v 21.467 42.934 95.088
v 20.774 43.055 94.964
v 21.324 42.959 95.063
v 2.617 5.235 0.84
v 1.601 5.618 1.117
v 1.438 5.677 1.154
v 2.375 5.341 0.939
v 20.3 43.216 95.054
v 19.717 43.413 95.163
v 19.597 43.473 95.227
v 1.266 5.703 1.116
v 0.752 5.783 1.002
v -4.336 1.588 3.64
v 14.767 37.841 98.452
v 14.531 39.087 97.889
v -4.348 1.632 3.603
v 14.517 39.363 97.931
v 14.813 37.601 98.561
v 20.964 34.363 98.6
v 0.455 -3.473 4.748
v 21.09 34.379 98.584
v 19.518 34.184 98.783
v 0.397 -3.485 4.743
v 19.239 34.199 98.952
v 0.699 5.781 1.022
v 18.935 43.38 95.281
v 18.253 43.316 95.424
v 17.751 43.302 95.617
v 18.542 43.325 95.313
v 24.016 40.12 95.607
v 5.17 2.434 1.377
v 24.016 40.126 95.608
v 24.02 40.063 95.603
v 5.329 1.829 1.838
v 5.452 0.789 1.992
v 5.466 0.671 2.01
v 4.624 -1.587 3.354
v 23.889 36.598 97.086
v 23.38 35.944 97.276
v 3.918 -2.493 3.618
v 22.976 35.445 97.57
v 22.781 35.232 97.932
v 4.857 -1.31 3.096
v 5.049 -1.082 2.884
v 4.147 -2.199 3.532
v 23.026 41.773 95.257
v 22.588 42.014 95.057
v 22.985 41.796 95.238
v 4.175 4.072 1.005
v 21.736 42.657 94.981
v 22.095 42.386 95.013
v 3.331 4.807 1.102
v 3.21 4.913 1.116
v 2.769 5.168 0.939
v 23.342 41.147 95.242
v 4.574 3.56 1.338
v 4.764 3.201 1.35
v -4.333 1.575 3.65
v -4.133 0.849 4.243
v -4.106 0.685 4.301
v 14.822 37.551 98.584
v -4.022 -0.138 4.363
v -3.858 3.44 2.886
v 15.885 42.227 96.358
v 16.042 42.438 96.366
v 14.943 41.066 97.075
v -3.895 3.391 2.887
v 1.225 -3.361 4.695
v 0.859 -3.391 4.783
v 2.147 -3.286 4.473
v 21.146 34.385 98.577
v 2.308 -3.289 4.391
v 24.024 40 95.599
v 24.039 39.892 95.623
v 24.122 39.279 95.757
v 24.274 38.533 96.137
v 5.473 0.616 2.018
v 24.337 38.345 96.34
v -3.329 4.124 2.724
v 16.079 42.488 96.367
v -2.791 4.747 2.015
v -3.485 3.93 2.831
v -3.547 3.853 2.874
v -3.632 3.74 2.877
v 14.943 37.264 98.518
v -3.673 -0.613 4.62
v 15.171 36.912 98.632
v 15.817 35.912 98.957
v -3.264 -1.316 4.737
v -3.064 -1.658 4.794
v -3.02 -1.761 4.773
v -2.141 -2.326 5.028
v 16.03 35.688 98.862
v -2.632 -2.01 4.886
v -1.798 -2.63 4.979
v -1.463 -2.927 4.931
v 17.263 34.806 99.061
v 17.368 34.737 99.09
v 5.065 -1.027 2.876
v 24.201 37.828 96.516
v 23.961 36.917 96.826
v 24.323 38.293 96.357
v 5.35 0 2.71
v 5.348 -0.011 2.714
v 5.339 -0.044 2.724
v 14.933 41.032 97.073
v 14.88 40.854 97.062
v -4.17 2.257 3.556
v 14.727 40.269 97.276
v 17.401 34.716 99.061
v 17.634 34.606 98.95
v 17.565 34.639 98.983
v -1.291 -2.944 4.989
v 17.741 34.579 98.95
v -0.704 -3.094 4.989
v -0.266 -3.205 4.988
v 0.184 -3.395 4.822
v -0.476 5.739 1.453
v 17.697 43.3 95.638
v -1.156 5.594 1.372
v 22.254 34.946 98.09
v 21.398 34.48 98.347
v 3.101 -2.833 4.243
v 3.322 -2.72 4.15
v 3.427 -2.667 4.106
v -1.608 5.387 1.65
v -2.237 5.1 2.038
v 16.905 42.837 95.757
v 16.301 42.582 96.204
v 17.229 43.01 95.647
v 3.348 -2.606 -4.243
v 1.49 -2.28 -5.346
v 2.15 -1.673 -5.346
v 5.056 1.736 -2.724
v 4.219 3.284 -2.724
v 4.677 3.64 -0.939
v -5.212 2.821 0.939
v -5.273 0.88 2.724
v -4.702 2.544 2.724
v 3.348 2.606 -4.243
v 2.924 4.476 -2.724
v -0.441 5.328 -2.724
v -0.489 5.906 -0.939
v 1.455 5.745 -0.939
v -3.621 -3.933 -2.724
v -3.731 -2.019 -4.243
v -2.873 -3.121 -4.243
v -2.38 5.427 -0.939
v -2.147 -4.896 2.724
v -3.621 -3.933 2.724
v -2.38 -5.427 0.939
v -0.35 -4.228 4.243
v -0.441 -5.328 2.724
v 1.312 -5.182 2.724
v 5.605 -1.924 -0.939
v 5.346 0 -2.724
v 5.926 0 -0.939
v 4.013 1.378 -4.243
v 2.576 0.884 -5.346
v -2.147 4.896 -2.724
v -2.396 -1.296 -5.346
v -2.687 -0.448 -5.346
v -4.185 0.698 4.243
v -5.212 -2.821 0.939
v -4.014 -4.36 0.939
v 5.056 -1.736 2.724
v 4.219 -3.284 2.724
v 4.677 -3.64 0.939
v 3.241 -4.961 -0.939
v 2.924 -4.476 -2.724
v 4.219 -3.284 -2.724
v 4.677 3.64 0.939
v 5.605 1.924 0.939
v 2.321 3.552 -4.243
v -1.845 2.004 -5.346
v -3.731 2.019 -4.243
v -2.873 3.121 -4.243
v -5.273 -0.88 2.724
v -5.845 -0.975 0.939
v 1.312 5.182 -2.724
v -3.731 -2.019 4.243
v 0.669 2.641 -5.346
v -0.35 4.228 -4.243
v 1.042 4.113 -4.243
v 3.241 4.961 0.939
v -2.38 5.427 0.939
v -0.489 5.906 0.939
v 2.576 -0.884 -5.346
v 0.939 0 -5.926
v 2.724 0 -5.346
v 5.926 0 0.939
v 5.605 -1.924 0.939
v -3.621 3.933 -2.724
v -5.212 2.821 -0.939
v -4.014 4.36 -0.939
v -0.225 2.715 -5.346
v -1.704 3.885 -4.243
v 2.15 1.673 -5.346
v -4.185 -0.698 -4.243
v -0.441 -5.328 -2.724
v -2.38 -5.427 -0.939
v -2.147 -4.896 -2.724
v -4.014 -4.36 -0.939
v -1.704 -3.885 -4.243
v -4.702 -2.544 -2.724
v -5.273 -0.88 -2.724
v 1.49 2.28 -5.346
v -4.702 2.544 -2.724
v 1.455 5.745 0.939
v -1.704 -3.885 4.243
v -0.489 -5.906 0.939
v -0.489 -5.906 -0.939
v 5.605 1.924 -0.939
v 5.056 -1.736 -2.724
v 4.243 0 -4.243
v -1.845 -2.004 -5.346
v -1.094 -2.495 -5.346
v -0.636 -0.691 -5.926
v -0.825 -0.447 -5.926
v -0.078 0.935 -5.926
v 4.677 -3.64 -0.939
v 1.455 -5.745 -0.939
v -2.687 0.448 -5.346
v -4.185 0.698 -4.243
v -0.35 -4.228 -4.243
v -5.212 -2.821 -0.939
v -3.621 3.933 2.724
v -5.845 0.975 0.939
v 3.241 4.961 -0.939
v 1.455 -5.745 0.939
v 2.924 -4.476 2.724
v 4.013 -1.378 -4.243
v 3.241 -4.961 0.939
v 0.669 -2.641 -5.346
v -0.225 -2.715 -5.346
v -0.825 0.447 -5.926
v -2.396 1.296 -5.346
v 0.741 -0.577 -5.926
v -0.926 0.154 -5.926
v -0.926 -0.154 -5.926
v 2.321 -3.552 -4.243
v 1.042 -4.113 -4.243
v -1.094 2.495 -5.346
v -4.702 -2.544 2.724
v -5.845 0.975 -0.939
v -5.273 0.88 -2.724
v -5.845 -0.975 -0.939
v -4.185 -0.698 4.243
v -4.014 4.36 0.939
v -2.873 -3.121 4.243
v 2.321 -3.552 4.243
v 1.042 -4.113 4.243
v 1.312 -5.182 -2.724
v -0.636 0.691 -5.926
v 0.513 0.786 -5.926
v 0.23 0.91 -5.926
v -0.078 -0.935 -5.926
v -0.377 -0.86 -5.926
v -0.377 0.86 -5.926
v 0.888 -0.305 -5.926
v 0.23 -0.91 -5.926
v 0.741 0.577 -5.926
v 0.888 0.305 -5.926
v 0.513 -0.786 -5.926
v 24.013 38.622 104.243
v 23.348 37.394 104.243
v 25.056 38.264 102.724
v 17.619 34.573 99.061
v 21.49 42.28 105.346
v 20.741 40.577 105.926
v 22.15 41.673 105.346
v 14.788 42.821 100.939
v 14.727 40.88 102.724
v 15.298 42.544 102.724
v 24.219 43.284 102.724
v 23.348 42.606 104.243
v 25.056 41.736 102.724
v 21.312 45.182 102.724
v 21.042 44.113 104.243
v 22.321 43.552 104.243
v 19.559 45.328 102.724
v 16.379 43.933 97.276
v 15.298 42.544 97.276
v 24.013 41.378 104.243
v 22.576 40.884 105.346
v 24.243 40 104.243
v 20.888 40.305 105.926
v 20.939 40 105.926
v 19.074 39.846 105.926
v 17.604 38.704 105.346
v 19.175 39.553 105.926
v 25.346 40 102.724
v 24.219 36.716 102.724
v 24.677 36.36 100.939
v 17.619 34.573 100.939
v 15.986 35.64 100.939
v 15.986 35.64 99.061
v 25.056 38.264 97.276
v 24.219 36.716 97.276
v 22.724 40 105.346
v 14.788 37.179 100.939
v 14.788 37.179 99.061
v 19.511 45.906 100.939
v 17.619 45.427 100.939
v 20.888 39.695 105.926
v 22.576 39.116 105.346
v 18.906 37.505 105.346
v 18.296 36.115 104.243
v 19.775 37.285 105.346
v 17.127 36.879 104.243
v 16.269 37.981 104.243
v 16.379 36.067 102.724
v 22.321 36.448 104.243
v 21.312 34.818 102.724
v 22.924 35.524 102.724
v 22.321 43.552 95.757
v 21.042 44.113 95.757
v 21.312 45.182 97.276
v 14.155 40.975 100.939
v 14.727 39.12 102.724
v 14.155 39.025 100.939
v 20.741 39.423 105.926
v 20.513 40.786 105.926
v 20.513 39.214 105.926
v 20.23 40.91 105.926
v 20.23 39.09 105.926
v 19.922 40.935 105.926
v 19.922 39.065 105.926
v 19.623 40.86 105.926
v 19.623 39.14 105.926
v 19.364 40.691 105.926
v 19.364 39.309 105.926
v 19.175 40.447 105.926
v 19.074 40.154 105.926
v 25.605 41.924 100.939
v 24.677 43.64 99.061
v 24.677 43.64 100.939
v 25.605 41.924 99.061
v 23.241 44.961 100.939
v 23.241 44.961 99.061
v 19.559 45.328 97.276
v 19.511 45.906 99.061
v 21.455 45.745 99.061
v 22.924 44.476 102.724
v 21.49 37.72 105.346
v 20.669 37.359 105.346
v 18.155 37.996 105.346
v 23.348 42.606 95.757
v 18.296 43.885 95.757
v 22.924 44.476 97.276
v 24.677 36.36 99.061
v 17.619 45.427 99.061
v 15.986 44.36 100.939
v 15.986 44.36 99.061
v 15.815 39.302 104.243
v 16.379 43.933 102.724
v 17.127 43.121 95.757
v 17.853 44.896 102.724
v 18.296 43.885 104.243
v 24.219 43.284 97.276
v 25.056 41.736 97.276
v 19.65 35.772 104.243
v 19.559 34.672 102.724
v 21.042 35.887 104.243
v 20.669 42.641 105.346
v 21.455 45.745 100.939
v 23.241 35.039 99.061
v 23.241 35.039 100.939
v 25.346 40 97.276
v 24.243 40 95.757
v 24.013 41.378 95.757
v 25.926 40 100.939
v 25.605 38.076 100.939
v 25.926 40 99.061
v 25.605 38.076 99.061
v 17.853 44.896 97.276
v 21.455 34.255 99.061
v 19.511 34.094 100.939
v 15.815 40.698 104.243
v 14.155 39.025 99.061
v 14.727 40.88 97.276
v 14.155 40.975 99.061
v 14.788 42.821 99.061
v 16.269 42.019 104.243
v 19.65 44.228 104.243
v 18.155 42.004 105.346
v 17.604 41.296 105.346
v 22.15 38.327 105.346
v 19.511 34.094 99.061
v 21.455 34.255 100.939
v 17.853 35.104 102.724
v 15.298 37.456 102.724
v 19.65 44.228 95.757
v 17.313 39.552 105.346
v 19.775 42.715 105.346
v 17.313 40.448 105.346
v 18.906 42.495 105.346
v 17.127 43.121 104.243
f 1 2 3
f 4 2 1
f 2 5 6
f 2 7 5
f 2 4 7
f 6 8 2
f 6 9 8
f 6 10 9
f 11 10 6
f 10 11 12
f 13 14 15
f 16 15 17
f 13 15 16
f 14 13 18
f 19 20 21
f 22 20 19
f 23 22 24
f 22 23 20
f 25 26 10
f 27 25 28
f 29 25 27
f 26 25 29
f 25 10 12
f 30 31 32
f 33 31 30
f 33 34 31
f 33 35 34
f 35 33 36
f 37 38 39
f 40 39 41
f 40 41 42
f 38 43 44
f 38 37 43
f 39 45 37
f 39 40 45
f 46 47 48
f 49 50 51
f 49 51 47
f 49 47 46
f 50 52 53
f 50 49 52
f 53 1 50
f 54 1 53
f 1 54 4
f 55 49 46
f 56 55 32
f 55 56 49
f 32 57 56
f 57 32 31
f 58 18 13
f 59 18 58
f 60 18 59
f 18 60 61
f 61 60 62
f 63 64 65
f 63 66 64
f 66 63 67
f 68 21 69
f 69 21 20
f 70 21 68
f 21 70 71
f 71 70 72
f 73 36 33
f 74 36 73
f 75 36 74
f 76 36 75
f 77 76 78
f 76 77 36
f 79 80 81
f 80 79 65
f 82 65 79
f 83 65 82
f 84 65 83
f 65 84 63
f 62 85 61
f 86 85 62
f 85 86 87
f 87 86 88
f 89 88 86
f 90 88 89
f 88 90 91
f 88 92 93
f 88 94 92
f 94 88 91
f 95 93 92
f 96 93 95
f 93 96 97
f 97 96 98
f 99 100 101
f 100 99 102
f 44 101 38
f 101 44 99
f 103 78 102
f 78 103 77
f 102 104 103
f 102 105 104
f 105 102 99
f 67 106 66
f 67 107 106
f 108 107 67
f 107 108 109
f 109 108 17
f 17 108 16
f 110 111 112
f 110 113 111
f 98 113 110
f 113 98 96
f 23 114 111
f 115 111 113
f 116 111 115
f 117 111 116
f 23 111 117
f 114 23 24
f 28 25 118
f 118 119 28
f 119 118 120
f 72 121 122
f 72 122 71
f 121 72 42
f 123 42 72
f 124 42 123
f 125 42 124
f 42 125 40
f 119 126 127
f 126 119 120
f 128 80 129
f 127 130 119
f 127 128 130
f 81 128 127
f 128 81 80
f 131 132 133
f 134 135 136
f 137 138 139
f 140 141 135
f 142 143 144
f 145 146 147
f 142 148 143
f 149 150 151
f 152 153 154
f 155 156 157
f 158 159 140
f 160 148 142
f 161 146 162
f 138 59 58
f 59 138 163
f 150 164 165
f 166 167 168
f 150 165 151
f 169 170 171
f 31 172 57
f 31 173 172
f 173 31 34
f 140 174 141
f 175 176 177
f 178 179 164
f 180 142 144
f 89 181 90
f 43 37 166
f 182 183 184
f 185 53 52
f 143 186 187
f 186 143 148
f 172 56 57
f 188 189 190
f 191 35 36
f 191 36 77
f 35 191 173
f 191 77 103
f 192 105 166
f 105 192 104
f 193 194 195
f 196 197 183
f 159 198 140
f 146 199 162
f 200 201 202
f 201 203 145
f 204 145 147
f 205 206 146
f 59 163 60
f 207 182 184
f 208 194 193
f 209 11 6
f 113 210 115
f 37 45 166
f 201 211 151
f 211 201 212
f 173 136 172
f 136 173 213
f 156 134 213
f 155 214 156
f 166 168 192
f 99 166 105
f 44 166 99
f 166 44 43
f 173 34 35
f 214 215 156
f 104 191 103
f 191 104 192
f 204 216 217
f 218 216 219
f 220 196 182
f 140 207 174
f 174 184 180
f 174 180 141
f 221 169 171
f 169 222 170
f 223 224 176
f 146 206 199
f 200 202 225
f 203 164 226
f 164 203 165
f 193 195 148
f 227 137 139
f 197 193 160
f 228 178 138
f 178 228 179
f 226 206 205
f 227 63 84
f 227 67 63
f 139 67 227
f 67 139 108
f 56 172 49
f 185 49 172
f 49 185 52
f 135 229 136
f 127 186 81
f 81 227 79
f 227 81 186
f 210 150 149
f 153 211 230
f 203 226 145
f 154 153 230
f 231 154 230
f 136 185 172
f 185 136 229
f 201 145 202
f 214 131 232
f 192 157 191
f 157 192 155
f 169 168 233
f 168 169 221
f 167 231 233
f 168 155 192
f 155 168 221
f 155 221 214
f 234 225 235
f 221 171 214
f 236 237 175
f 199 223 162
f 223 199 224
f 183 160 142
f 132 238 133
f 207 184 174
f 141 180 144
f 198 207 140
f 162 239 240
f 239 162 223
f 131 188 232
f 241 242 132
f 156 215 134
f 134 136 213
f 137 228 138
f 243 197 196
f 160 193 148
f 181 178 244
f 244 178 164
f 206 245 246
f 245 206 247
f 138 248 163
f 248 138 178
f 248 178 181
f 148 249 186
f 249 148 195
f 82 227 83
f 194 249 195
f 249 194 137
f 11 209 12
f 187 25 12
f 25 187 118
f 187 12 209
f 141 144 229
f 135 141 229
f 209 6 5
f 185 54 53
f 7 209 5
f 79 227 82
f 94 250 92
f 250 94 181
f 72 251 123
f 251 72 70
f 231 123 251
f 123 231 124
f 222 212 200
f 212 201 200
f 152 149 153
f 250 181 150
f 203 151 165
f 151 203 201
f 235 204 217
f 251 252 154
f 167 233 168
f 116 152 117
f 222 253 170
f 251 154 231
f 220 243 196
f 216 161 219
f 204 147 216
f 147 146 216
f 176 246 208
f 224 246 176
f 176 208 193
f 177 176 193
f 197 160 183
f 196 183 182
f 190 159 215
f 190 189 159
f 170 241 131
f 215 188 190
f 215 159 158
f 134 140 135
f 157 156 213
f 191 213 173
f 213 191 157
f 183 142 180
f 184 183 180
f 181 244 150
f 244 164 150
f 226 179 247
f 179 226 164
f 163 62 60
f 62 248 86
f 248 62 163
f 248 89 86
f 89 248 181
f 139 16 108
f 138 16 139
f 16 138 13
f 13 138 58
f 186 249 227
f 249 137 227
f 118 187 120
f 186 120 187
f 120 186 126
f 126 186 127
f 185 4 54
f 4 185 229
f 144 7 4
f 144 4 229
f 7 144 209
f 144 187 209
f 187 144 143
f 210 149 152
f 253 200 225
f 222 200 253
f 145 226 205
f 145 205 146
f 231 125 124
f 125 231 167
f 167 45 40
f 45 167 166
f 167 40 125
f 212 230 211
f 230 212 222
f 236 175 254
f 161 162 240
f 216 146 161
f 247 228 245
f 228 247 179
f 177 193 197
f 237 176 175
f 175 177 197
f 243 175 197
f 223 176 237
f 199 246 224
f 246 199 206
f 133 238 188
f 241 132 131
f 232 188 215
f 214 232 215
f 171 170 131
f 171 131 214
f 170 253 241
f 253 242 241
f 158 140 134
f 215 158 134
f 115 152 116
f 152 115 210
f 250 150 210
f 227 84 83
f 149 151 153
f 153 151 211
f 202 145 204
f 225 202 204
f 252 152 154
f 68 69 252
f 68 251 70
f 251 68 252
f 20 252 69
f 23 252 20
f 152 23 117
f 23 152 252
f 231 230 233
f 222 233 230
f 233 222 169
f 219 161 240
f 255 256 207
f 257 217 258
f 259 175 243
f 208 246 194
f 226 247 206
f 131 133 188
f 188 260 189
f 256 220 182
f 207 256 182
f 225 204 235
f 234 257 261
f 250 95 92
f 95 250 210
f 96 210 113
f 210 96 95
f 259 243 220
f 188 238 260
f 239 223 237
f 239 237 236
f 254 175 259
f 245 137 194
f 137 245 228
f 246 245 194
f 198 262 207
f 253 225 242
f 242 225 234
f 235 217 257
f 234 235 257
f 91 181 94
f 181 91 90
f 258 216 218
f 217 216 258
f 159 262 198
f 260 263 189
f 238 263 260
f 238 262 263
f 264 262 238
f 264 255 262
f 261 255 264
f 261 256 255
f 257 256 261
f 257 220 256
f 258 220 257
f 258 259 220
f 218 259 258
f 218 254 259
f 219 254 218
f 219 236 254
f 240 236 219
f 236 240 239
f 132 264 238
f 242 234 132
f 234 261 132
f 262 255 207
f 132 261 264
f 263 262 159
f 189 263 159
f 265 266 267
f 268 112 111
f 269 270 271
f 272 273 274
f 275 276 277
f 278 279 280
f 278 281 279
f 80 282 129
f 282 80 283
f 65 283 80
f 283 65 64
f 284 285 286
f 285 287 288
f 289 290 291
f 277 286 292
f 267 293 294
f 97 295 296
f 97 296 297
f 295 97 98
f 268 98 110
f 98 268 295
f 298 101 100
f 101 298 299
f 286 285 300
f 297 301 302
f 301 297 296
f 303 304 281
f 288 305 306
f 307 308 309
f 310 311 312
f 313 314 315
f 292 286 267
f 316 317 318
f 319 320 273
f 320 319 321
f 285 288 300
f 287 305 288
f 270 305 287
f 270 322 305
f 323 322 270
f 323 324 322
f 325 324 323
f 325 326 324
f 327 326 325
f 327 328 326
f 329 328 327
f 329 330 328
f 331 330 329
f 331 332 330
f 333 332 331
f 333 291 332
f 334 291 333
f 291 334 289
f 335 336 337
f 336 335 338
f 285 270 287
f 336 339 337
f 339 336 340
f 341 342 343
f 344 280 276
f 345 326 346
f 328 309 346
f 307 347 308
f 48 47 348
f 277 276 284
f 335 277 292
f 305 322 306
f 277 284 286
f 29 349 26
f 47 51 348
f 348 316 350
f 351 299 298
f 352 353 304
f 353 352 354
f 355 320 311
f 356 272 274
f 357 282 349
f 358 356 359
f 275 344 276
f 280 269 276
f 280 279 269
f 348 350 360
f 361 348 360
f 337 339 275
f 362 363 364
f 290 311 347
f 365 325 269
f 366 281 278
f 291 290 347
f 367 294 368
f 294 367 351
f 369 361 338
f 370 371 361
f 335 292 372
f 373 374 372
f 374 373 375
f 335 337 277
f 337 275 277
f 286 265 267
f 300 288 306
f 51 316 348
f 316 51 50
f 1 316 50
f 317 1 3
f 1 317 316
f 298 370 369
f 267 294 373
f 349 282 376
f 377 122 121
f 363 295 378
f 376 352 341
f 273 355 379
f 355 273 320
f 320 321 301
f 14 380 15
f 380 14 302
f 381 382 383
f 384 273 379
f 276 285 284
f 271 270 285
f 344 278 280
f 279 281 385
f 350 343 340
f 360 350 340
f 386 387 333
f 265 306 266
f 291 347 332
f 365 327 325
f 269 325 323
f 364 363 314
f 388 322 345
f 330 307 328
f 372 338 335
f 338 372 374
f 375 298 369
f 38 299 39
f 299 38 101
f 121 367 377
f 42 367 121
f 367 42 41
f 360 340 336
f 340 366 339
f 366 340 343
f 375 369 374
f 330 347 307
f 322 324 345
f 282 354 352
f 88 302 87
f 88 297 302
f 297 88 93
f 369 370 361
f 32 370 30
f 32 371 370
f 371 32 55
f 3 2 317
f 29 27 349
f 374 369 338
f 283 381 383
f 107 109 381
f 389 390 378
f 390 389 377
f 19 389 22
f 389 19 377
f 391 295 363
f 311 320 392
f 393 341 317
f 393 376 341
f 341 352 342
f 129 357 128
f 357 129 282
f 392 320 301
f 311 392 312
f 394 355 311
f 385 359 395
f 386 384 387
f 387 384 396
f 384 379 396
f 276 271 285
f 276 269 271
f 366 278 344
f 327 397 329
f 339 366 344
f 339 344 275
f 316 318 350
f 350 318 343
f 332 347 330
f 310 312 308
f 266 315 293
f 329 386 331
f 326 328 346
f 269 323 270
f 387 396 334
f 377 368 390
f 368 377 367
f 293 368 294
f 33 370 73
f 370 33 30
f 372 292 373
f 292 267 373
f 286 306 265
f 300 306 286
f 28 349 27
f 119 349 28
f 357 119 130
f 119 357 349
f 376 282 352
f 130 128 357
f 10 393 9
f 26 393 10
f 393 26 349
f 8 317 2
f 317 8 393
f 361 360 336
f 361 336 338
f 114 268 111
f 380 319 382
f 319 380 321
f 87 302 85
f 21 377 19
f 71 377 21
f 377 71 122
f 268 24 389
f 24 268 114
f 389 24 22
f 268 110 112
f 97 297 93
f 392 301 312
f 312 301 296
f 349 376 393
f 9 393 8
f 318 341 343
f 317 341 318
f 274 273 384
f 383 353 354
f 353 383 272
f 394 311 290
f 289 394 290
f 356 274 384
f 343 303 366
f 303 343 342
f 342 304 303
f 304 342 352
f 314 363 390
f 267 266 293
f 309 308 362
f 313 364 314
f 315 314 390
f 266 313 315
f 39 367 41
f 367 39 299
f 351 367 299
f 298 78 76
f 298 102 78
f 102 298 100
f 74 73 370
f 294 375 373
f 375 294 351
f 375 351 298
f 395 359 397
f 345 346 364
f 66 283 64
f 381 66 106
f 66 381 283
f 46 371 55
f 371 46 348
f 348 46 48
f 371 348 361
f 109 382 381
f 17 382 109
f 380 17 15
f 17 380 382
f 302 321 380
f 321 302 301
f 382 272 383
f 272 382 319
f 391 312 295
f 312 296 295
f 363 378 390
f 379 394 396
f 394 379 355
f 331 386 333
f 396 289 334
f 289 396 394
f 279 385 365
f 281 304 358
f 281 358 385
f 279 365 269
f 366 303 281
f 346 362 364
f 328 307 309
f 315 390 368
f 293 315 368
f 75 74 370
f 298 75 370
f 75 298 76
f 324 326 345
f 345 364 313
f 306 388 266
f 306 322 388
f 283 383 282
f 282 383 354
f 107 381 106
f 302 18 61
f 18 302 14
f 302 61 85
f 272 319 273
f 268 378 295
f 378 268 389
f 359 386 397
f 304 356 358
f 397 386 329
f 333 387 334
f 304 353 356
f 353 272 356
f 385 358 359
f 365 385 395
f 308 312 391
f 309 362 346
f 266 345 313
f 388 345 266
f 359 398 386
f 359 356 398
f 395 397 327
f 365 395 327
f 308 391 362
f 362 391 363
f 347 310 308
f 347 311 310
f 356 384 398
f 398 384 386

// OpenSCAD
module bond(p1=[0,0,0],p2=[1,1,1],r=1)
{
    d = p2 - p1;
    H = sqrt(d[0]*d[0] + d[1]*d[1] + d[2]*d[2]);
    R = sqrt(d[0]*d[0] + d[1]*d[1]);
    //atan2(y,x)
    theta = 90-atan2(d[2],R);
    phi   = atan2(d[1],d[0]);
    echo(theta,phi);
    translate(p1)
    rotate([0,theta,phi])
    cylinder(r=r, h=H);
}


bond([0,0,0], [20,40,100], r=5);

sphere(r=6);
translate([20,40,100])
    sphere(r=6);
